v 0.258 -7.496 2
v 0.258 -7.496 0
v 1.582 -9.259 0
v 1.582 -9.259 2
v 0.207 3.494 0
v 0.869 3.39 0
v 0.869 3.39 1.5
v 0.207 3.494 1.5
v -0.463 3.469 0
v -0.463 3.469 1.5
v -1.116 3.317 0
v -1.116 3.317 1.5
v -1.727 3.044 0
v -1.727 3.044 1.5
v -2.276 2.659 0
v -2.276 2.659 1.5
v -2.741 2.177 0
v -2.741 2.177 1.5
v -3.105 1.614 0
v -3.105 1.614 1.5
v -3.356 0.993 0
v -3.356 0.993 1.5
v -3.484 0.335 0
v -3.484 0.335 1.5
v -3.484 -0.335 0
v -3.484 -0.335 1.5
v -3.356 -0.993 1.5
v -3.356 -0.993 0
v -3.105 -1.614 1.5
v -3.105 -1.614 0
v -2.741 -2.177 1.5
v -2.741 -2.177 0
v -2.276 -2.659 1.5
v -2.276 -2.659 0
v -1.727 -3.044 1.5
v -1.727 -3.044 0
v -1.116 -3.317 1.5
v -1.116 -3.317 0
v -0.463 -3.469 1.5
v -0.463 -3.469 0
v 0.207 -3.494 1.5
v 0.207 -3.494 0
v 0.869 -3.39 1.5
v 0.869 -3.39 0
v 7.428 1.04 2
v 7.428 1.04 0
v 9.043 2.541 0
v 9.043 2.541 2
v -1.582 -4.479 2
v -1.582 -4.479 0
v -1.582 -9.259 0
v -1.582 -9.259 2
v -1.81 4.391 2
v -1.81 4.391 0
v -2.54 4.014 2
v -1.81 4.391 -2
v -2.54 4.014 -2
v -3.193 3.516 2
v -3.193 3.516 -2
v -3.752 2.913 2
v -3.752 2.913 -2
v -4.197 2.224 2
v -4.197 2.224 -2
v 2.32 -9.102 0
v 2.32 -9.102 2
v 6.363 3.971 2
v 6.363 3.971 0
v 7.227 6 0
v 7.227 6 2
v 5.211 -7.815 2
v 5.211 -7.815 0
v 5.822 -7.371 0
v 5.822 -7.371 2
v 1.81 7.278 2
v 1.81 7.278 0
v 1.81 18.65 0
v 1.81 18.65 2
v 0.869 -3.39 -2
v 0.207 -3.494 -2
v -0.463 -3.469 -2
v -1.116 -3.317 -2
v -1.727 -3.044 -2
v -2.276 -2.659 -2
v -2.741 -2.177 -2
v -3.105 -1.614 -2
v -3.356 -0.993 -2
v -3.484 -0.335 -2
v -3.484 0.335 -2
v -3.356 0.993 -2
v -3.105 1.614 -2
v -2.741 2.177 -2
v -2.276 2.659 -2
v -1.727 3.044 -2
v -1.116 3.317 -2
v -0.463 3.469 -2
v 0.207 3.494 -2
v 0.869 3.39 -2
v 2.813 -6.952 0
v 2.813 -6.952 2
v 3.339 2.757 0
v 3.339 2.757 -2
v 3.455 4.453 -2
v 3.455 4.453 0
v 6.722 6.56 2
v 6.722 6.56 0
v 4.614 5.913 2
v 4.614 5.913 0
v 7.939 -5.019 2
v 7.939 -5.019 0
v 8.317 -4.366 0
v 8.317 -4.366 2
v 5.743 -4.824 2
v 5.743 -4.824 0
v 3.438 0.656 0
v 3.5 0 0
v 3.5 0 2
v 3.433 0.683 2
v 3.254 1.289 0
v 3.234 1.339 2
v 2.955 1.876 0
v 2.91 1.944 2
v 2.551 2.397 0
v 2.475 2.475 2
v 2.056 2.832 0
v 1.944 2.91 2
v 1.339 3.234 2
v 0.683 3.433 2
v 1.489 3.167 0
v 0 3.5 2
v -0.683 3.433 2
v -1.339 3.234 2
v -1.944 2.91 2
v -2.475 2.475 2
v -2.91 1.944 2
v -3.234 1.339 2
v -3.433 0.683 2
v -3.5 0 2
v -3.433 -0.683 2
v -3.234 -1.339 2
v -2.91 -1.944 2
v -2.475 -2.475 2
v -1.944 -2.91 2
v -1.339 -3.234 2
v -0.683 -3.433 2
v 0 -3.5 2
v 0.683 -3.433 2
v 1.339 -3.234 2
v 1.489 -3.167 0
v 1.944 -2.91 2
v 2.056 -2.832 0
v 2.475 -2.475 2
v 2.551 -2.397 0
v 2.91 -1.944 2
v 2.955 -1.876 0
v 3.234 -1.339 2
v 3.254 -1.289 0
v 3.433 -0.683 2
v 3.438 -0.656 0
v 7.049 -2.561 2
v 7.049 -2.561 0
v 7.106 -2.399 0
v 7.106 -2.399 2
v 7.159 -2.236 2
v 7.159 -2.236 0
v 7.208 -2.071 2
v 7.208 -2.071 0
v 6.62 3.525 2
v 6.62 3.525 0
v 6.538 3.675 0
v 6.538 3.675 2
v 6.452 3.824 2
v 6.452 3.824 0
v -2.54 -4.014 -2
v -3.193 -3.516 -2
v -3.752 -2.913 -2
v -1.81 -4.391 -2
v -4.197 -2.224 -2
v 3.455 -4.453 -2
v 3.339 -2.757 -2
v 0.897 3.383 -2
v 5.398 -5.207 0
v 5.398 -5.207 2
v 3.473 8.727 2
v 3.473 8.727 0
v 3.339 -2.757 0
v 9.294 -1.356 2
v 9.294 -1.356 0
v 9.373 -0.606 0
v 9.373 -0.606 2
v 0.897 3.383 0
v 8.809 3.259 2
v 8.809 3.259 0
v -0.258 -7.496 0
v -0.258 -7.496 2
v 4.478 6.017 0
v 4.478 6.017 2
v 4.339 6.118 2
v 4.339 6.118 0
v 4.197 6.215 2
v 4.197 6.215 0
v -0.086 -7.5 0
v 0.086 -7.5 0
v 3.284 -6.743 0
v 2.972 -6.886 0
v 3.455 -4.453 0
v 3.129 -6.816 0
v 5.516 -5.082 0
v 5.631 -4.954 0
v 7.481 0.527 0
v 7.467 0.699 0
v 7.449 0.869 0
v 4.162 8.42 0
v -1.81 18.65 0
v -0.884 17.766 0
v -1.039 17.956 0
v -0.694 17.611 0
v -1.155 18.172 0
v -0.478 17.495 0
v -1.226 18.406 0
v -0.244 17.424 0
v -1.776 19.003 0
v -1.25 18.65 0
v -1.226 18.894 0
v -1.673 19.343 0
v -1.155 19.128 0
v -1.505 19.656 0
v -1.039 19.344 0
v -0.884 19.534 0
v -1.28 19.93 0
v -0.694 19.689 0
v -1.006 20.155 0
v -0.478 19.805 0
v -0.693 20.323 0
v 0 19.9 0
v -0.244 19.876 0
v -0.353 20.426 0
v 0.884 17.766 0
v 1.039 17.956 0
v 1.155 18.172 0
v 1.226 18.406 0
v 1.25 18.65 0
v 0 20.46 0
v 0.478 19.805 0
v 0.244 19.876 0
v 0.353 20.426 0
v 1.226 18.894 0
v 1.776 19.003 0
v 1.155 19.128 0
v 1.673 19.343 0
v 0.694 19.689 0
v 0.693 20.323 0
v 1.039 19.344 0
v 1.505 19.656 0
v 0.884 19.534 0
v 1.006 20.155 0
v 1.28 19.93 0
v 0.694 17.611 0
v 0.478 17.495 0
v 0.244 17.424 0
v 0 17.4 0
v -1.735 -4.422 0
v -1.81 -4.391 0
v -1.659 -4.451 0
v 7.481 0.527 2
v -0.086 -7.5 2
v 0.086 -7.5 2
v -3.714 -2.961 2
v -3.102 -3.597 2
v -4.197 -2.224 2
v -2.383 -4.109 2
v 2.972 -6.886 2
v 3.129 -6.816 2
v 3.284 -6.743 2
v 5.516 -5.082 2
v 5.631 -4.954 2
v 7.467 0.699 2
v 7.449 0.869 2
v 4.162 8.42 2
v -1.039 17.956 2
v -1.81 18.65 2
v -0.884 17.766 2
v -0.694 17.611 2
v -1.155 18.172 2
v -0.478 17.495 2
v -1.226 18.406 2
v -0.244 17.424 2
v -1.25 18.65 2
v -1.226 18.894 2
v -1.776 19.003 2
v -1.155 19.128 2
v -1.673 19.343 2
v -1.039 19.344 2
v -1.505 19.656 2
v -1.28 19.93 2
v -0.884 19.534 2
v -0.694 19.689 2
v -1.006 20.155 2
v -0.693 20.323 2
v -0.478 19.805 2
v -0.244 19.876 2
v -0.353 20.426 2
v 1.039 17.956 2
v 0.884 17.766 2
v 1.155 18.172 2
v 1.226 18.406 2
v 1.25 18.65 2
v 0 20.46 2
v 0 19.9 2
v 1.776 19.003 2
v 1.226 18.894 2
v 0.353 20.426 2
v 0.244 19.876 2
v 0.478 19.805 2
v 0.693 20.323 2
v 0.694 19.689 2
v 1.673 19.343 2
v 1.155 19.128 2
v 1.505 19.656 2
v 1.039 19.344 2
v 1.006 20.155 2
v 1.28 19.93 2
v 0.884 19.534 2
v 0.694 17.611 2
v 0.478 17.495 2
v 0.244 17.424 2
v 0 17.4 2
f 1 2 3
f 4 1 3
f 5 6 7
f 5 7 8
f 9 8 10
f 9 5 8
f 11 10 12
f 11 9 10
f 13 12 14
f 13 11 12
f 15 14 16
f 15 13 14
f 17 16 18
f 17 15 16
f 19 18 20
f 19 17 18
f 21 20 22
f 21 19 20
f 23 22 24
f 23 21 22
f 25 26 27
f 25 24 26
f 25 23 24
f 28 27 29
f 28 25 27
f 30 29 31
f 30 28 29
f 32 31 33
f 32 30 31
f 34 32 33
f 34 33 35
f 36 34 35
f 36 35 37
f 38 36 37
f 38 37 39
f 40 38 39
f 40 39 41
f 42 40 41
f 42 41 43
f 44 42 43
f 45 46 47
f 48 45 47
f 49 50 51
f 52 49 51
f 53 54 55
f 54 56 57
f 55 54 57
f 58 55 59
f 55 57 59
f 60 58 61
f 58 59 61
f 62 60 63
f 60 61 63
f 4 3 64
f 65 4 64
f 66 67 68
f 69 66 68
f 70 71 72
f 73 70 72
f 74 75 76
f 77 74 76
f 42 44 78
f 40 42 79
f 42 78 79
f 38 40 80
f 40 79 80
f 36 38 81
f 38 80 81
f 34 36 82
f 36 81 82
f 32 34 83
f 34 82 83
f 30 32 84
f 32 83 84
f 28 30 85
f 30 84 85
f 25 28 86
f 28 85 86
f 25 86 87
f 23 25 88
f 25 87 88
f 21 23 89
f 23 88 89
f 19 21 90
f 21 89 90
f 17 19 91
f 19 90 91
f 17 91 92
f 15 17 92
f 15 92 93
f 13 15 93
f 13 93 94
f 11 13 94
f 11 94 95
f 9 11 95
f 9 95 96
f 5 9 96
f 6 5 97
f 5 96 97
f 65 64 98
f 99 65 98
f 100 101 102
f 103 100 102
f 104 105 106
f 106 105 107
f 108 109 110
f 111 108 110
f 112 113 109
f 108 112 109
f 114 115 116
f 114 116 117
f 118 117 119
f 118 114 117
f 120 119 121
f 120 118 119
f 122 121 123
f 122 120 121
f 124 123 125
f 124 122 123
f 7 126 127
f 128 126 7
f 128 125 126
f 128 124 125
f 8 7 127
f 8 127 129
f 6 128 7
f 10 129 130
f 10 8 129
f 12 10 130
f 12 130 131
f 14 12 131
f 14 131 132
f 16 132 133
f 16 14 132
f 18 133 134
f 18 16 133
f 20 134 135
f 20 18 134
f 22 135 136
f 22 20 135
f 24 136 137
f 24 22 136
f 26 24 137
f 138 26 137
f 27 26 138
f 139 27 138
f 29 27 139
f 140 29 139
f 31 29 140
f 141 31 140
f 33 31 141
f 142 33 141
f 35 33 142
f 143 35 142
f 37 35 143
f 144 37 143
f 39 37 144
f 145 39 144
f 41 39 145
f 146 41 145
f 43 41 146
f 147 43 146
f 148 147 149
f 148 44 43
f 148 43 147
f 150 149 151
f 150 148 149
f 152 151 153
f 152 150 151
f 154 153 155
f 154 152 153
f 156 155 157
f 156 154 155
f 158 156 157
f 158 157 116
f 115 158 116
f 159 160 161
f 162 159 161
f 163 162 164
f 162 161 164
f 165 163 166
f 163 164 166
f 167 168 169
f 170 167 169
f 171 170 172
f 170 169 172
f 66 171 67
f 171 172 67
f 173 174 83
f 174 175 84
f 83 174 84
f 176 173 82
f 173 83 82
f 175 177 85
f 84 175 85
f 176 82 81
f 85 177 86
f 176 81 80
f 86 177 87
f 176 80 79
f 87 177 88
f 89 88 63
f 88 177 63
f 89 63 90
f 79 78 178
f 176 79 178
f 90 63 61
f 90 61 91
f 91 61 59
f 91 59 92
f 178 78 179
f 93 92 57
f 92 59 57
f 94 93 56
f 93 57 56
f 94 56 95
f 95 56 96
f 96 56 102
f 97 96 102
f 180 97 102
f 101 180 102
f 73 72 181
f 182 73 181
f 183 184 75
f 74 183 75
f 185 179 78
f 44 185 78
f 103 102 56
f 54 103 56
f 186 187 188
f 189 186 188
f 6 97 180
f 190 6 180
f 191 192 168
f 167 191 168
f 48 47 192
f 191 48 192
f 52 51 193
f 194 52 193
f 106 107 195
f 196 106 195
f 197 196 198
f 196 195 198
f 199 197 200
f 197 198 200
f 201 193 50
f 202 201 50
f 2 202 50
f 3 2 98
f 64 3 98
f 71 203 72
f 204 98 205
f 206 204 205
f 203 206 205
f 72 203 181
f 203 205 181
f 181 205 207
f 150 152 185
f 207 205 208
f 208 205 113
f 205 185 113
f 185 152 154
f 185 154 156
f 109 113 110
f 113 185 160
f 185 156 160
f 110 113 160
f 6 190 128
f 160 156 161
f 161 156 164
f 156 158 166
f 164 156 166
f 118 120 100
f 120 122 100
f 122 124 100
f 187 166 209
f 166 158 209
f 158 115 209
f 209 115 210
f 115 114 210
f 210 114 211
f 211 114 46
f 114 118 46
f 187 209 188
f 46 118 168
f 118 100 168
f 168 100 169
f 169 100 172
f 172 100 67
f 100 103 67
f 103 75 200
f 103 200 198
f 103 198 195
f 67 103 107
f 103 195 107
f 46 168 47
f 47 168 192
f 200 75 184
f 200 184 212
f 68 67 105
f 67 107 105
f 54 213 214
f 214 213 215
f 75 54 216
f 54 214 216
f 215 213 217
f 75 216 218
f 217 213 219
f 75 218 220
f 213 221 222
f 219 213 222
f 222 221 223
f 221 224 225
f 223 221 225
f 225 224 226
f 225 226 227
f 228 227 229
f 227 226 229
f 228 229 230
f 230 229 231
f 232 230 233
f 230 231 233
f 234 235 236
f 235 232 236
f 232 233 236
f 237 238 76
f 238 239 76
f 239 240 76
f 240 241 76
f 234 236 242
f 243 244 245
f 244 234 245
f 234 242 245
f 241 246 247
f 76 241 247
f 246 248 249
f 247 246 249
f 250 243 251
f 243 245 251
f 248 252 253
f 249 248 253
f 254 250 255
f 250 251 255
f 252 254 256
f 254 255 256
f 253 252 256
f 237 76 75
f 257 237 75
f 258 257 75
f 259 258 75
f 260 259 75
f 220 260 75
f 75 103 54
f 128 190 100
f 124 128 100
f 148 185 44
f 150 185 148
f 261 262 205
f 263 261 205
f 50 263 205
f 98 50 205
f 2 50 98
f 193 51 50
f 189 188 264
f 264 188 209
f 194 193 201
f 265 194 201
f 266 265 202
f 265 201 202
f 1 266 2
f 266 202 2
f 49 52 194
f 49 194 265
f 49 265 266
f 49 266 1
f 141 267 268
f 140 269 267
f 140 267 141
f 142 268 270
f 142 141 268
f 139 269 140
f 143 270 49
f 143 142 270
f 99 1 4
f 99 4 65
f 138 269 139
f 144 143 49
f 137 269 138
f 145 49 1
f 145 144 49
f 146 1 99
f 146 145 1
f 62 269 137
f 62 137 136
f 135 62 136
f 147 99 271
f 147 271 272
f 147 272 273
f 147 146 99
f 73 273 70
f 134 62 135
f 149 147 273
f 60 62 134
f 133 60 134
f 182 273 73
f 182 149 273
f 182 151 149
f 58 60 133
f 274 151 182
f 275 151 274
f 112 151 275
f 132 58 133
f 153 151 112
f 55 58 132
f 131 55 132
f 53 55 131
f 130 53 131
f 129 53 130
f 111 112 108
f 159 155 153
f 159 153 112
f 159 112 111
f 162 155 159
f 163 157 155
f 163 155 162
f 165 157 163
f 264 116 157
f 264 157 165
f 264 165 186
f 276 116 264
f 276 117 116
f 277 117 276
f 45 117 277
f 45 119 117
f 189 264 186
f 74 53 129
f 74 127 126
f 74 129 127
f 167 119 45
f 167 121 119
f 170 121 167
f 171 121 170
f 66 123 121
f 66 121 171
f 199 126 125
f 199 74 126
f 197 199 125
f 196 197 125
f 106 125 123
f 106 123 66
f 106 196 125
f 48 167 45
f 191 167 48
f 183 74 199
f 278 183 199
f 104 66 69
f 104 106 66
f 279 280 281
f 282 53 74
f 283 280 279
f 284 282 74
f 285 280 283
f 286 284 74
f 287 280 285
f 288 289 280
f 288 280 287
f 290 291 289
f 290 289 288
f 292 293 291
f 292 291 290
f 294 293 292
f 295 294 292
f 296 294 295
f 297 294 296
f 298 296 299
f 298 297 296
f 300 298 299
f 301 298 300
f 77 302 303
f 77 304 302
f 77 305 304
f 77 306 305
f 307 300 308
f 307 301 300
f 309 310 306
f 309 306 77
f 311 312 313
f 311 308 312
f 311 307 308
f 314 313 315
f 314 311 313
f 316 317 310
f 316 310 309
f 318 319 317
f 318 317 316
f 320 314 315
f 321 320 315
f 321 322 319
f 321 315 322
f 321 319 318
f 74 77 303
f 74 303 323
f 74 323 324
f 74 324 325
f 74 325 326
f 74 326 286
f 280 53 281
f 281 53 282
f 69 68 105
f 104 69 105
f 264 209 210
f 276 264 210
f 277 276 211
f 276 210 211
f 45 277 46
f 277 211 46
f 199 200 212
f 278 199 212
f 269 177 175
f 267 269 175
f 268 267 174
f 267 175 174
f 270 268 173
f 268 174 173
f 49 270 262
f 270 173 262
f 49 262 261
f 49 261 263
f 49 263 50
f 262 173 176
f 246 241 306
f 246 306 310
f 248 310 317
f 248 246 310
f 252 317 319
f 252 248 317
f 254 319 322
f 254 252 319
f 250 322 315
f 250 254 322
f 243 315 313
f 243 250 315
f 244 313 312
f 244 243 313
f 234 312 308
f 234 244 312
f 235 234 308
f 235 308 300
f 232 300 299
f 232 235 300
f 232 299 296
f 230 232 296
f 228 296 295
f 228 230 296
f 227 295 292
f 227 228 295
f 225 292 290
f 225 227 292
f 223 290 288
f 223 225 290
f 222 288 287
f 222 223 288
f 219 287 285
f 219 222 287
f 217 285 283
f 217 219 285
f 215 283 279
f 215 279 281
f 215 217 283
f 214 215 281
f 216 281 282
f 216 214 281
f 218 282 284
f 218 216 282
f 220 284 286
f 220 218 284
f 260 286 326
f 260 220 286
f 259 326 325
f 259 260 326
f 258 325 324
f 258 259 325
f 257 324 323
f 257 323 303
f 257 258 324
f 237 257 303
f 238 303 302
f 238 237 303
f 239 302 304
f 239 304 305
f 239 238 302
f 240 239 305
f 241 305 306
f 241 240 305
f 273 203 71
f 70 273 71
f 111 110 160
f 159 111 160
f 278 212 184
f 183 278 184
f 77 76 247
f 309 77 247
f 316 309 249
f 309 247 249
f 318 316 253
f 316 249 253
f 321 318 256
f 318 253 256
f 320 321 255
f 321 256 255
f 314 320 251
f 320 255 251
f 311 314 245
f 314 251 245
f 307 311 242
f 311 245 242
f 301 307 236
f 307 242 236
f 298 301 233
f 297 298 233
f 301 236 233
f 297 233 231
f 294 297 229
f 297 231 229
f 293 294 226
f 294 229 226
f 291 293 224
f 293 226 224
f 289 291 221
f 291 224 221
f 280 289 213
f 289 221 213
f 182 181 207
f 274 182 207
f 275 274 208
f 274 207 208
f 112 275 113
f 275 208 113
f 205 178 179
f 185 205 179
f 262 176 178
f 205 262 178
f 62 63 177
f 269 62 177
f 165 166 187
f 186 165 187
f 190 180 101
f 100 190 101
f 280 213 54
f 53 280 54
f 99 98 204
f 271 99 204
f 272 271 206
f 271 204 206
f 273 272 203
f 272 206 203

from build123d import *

# Parameters (mm, degrees)
SKETCH1_R           = 3.5
SKETCH1_R_2         = 1.25
BOSS_EXTRUDE2_DEPTH = 2
BOSS_EXTRUDE3_START = -2
BOSS_EXTRUDE3_DEPTH = 3.5


with BuildPart() as part:
    # Sketch1 → Boss-Extrude2 (new body)
    with BuildSketch(Plane.XY):
        with BuildLine():
            Line((4.197420544, 6.215437295), (4.162047902, 8.420458768))
            Line((4.162047902, 8.420458768), (3.472666725, 8.727391043))
            Line((3.472666725, 8.727391043), (1.81034751, 7.278230684))
            Line((1.81034751, 7.278230684), (1.81034751, 18.65))
            ThreePointArc((1.81034751, 18.65), (0, 20.46034751), (-1.81034751, 18.65))
            Line((-1.81034751, 18.65), (-1.81034751, 4.391485158))
            ThreePointArc((-1.81034751, 4.391485158), (-3.193479033, 3.516275255), (-4.197420544, 2.22354689))
            Line((-4.197420544, 2.22354689), (-4.197420544, -2.22354689))
            ThreePointArc((-4.197420544, -2.22354689), (-3.102034148, -3.597205046), (-1.582253997, -4.478724404))
            Line((-1.582253997, -4.478724404), (-1.582253997, -9.258684619))
            Line((-1.582253997, -9.258684619), (-0.257557826, -7.495576293))
            ThreePointArc((-0.257557826, -7.495576293), (0, -7.5), (0.257557826, -7.495576293))
            Line((0.257557826, -7.495576293), (1.582253997, -9.258684619))
            Line((1.582253997, -9.258684619), (2.32038535, -9.101789957))
            Line((2.32038535, -9.101789957), (2.813434757, -6.952307881))
            ThreePointArc((2.813434757, -6.952307881), (3.050524823, -6.851590932), (3.284016321, -6.74279147))
            Line((3.284016321, -6.74279147), (5.211307253, -7.814668599))
            Line((5.211307253, -7.814668599), (5.821808989, -7.371113124))
            Line((5.821808989, -7.371113124), (5.397958912, -5.206922276))
            ThreePointArc((5.397958912, -5.206922276), (5.573586191, -5.018479548), (5.74263856, -4.824116744))
            Line((5.74263856, -4.824116744), (7.939278142, -5.019425383))
            Line((7.939278142, -5.019425383), (8.316588965, -4.365903867))
            Line((8.316588965, -4.365903867), (7.049126932, -2.561212506))
            ThreePointArc((7.049126932, -2.561212506), (7.132923872, -2.317627458), (7.208306422, -2.071308409))
            Line((7.208306422, -2.071308409), (9.294475714, -1.356277919))
            Line((9.294475714, -1.356277919), (9.373355155, -0.605790169))
            Line((9.373355155, -0.605790169), (7.481436866, 0.527354174))
            ThreePointArc((7.481436866, 0.527354174), (7.458914215, 0.783963475), (7.427592618, 1.039647968))
            Line((7.427592618, 1.039647968), (9.042573998, 2.541382319))
            Line((9.042573998, 2.541382319), (8.809383085, 3.259070153))
            Line((8.809383085, 3.259070153), (6.620138399, 3.524736526))
            ThreePointArc((6.620138399, 3.524736526), (6.495190528, 3.75), (6.362580573, 3.970839767))
            Line((6.362580573, 3.970839767), (7.227129088, 5.999614466))
            Line((7.227129088, 5.999614466), (6.722188648, 6.560407638))
            Line((6.722188648, 6.560407638), (4.614157861, 5.912659912))
            ThreePointArc((4.614157861, 5.912659912), (4.408389392, 6.067627458), (4.197420544, 6.215437295))
        make_face()
        Circle(SKETCH1_R, mode=Mode.SUBTRACT)
        with Locations((0, 18.65)):
            Circle(SKETCH1_R_2, mode=Mode.SUBTRACT)
    extrude(amount=BOSS_EXTRUDE2_DEPTH)

    # Sketch1<4> → Boss-Extrude3 (add)
    with BuildSketch(Plane.XY.offset(BOSS_EXTRUDE3_START)):
        with BuildLine():
            Line((3.454592444, 4.453459903), (-1.81034751, 4.391485158))
            ThreePointArc((-1.81034751, 4.391485158), (-3.193479033, 3.516275255), (-4.197420544, 2.22354689))
            Line((-4.197420544, 2.22354689), (-4.197420544, -2.22354689))
            ThreePointArc((-4.197420544, -2.22354689), (-3.193479033, -3.516275255), (-1.81034751, -4.391485158))
            Line((-1.81034751, -4.391485158), (3.454592444, -4.453459903))
            Line((3.454592444, -4.453459903), (3.339363392, -2.757369614))
            Line((3.339363392, -2.757369614), (0.868808697, -3.390452986))
            ThreePointArc((0.868808697, -3.390452986), (-3.5, 0), (0.868808697, 3.390452986))
            Line((0.868808697, 3.390452986), (0.896736855, 3.383296353))
            Line((0.896736855, 3.383296353), (3.339363392, 2.757369614))
            Line((3.339363392, 2.757369614), (3.454592444, 4.453459903))
        make_face()
    extrude(amount=BOSS_EXTRUDE3_DEPTH)


solid = part.part
